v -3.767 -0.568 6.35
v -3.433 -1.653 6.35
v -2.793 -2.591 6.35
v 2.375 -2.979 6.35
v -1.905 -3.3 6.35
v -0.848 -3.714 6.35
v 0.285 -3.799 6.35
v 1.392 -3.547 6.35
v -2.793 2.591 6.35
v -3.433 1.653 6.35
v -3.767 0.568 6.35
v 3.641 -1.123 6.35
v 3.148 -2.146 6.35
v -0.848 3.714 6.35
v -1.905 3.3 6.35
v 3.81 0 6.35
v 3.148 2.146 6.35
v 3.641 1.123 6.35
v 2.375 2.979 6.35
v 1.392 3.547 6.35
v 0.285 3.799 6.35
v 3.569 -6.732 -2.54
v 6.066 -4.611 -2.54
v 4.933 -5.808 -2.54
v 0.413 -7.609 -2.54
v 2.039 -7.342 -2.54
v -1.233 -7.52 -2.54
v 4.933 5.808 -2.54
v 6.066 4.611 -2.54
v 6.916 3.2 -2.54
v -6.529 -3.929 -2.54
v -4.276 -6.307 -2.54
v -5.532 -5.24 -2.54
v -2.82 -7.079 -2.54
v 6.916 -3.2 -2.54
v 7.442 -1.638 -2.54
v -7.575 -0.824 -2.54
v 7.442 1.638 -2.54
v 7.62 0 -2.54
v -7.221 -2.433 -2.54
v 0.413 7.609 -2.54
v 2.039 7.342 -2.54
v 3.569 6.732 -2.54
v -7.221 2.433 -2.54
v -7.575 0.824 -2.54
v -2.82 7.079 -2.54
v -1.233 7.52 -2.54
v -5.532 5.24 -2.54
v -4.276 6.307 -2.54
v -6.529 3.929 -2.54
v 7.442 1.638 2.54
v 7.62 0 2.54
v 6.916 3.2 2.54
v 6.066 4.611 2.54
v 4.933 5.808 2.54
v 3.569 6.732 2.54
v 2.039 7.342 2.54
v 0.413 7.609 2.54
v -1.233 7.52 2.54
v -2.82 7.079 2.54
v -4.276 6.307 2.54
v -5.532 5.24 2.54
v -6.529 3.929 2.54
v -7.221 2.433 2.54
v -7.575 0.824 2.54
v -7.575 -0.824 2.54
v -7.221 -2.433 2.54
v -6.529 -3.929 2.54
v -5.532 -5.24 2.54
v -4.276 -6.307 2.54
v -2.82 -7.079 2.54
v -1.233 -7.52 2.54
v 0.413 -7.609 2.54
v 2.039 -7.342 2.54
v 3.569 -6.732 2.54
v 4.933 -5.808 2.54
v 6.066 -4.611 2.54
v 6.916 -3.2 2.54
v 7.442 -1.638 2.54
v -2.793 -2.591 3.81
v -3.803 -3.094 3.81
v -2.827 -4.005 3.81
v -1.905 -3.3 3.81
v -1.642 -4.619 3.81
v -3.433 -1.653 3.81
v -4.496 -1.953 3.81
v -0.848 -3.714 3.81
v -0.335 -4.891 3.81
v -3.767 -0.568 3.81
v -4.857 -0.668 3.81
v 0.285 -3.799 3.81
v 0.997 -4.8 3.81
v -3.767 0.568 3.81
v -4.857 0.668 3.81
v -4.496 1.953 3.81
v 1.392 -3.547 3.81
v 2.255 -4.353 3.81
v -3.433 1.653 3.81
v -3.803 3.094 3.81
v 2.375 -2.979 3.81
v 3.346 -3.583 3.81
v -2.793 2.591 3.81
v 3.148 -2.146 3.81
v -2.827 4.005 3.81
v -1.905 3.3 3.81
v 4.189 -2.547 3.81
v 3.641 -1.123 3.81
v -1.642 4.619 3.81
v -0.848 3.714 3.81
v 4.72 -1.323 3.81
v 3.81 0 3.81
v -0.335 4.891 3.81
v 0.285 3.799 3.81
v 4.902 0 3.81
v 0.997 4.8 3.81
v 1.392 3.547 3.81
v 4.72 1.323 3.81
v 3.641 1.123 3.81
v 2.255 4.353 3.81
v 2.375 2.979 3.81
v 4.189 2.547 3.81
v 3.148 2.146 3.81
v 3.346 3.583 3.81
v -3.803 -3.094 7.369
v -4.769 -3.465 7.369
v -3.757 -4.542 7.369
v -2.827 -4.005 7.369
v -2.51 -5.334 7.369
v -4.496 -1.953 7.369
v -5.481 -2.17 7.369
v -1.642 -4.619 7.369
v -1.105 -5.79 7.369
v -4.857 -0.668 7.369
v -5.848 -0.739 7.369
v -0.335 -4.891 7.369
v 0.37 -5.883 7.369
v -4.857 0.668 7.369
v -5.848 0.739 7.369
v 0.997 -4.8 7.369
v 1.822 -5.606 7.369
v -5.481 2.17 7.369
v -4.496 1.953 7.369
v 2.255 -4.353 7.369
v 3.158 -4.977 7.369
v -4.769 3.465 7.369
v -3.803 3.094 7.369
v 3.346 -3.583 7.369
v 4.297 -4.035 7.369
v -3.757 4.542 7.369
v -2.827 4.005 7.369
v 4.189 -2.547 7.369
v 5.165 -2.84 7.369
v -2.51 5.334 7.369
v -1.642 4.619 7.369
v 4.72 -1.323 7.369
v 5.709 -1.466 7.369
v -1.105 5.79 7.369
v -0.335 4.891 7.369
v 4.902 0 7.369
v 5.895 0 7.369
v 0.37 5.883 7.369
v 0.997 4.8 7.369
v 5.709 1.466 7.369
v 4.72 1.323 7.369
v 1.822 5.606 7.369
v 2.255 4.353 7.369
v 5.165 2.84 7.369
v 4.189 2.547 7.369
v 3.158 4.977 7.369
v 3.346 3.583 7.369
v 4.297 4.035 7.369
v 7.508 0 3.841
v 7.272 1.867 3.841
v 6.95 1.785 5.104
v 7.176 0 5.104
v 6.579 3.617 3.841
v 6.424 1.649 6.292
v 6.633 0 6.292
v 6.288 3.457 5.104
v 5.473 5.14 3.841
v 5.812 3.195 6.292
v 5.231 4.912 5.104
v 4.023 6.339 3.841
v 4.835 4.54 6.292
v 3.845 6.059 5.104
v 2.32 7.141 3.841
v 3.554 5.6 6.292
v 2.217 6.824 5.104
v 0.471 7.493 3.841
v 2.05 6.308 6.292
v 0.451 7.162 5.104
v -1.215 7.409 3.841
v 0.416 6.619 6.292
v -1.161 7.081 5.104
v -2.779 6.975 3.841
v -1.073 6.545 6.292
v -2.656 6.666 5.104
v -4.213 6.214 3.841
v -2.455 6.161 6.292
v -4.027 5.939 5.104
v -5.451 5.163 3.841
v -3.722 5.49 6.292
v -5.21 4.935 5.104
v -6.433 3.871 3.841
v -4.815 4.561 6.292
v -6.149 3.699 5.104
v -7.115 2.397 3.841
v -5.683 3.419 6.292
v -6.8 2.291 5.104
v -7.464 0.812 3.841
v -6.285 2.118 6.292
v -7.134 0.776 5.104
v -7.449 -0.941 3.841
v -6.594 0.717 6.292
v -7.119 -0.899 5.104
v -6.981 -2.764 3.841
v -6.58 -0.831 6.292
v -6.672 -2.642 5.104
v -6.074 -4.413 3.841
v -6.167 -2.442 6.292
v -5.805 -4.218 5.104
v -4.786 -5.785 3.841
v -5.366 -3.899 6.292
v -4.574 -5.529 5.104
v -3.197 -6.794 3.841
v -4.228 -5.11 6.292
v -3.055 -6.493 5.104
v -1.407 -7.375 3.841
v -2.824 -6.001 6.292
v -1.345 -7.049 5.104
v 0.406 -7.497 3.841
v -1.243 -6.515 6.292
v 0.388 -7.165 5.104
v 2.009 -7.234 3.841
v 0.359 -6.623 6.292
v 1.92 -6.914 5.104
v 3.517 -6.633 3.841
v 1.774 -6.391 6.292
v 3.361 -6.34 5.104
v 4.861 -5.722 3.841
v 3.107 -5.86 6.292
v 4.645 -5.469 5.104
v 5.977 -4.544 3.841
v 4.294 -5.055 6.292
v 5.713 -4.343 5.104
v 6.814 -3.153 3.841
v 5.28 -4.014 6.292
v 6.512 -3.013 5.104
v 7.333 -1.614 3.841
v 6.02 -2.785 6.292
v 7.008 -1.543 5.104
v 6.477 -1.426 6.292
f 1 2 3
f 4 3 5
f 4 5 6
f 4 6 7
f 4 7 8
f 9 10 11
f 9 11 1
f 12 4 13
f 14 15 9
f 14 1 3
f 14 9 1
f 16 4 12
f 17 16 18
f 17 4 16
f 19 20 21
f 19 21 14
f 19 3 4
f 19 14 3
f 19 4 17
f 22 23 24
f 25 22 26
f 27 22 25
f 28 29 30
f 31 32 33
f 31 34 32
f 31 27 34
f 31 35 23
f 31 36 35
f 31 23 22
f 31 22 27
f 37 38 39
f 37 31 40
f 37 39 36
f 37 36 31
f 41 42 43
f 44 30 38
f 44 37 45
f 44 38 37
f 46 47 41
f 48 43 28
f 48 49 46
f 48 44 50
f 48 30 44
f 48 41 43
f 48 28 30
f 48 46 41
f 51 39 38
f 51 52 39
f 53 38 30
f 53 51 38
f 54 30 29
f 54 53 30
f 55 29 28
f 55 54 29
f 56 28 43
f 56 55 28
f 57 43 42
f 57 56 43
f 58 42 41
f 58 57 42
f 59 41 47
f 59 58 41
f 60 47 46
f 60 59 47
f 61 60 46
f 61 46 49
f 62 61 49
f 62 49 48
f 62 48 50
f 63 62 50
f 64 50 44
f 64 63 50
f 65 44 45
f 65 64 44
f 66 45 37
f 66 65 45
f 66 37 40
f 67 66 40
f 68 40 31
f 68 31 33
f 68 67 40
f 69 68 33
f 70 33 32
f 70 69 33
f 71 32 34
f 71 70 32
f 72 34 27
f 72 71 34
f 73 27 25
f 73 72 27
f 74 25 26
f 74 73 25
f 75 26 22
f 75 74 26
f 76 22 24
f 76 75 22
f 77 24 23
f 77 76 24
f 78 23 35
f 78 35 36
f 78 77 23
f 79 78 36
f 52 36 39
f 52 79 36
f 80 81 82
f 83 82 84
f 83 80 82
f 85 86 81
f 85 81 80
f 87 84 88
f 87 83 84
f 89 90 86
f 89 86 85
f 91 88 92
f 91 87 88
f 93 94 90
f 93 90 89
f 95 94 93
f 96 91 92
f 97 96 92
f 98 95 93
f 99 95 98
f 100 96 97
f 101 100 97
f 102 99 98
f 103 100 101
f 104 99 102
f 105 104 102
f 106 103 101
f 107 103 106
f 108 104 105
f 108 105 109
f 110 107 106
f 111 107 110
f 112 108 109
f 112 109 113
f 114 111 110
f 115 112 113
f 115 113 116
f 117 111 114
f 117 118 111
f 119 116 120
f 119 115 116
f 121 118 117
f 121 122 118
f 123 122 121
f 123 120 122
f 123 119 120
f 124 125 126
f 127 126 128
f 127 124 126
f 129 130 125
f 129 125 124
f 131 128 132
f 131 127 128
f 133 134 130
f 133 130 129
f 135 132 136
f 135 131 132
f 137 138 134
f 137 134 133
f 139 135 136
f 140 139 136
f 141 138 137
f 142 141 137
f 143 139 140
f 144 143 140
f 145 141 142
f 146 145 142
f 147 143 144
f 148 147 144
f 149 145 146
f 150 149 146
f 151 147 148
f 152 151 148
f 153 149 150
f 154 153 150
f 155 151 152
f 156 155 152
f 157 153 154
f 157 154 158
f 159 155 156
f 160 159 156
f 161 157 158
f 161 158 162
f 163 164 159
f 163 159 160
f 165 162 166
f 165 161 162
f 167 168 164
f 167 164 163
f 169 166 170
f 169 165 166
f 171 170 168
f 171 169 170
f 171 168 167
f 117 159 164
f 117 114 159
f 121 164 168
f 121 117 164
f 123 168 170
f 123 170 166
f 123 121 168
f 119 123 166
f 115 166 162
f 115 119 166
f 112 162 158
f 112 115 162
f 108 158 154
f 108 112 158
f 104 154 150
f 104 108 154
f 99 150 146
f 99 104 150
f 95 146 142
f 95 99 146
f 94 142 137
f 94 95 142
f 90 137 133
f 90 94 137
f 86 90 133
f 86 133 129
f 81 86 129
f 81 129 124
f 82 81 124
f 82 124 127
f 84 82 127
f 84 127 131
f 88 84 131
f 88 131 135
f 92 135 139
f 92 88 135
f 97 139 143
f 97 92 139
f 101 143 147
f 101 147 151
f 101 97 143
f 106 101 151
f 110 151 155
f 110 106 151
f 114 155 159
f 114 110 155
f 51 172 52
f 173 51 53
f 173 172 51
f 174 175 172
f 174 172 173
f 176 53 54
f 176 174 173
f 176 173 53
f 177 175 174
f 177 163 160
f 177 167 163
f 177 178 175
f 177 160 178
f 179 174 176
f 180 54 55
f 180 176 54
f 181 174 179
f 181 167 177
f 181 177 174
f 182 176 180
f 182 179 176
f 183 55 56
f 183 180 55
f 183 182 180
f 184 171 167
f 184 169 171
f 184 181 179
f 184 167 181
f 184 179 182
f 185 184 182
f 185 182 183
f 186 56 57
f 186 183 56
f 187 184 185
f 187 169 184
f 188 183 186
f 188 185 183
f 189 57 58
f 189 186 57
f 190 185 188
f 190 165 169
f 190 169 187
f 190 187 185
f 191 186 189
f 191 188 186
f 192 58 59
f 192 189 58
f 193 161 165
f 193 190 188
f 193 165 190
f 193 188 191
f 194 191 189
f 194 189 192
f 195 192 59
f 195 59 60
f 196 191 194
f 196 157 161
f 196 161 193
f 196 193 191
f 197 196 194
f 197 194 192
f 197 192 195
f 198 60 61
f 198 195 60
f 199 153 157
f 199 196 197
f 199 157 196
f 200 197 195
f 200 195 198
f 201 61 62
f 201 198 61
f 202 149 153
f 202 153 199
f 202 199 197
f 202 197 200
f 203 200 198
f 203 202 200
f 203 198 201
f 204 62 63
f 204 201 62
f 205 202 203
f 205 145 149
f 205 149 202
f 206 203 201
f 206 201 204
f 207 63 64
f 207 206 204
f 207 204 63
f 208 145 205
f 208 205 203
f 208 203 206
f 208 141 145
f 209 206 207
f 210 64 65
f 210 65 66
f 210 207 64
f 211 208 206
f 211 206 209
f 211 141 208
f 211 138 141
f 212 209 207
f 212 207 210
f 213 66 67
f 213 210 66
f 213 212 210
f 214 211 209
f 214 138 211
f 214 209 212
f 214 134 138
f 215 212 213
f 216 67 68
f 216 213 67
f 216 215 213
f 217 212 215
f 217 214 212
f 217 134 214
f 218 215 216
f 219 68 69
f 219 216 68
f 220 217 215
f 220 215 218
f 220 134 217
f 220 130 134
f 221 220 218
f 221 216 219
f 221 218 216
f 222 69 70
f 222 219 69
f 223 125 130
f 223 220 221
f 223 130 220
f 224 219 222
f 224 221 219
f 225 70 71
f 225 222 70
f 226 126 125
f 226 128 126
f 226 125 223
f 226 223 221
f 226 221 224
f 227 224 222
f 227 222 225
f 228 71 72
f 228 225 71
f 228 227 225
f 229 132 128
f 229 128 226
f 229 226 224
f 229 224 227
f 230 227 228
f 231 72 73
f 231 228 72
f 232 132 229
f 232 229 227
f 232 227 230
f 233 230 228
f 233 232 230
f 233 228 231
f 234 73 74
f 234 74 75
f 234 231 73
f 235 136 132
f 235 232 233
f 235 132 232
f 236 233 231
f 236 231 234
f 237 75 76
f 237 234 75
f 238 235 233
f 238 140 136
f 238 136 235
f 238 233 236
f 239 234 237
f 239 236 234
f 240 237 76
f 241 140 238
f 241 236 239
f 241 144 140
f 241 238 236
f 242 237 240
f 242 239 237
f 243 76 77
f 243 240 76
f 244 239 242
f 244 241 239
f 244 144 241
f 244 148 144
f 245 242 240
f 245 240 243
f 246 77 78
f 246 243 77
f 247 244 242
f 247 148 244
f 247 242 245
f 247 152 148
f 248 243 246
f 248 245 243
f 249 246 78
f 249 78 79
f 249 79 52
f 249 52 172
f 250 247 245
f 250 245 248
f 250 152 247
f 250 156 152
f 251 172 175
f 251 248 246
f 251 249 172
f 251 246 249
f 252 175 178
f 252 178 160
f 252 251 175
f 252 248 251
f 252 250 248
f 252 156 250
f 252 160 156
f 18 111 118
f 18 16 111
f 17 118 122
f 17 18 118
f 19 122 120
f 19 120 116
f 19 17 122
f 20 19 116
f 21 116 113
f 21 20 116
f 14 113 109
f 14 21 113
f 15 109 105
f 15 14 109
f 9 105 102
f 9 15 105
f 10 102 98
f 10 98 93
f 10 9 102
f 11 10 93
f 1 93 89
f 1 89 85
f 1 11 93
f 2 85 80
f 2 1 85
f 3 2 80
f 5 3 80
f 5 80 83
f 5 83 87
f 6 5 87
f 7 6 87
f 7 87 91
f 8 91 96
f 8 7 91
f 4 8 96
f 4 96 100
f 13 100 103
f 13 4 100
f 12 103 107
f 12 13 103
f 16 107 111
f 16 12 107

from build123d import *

# Parameters (mm, degrees)
F0_W = 7.62
F0_H = 2.54


with BuildPart() as f1:
    # F0 (on Front) → F1 (revolve)
    with BuildSketch(Plane.XZ):
        with BuildLine():
            Line((0, 2.54), (0, 0))
            Line((0, 0), (7.62, 0))
            Line((7.62, 0), (7.62, 2.54))
            ThreePointArc((7.62, 2.54), (7.175693, 5.103948), (5.894585, 7.368899))
            Line((5.894585, 7.368899), (4.9022, 7.368899))
            Line((4.9022, 7.368899), (4.9022, 3.81))
            Line((4.9022, 3.81), (3.81, 3.81))
            Line((3.81, 3.81), (3.81, 6.35))
            Line((3.81, 6.35), (0, 6.35))
            Line((0, 6.35), (0, 2.54))
        make_face()
        with Locations((3.81, -1.27)):
            Rectangle(F0_W, F0_H)
    revolve(axis=Axis((0, 0, 4.445), (0, 0, 1)))


with BuildPart() as f2_1:
    # F2: copy of F1
    add(f1.part.moved(Location((25.4, 0, 0))))


with BuildPart() as f3_1:
    # F3: copy of F1
    add(f1.part.moved(Location((0, 25.4, 0))))


with BuildPart() as f4_1:
    # F4: copy of F1
    add(f1.part.moved(Location((0, -25.4, 0))))


with BuildPart() as f5_1:
    # F5: copy of F1
    add(f1.part.moved(Location((-25.4, 0, 0))))


with BuildPart() as f6_1:
    # F6: copy of F2_1
    add(f2_1.part.moved(Location((0, 25.4, 0))))


with BuildPart() as f7_1:
    # F7: copy of F2_1
    add(f2_1.part.moved(Location((0, -25.4, 0))))


with BuildPart() as f8_1:
    # F8: copy of F5_1
    add(f5_1.part.moved(Location((0, -25.4, 0))))


with BuildPart() as f9_1:
    # F9: copy of F5_1
    add(f5_1.part.moved(Location((0, 25.4, 0))))


with BuildPart() as f10_1:
    # F10: copy of F5_1
    add(f5_1.part.moved(Location((-25.4, 0, 0))))


with BuildPart() as f11_1:
    # F11: copy of F2_1
    add(f2_1.part.moved(Location((25.4, 0, 0))))


solid = f1.part
